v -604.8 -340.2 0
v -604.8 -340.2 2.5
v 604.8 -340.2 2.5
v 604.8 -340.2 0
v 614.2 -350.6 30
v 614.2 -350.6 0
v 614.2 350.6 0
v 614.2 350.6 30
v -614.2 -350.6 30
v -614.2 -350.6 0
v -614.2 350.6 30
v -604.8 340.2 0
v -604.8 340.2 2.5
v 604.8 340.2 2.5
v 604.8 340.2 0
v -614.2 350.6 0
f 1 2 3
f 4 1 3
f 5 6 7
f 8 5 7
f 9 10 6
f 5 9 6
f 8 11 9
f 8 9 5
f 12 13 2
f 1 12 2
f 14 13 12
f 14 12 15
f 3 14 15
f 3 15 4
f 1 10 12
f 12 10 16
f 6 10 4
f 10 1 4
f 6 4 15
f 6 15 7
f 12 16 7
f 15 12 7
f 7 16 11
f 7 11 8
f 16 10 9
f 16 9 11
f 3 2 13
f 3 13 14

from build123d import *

# Parameters (mm, degrees)
F0_W     = 1228.4
F0_H     = 701.2
F1_DEPTH = 30
F2_W     = 1209.6
F2_H     = 680.4
F3_DEPTH = 2.5


with BuildPart() as f1:
    # F0 (on Top) → F1 (new body)
    with BuildSketch(Plane.XY):
        Rectangle(F0_W, F0_H)
    extrude(amount=F1_DEPTH)

    # F2 (on face) → F3 (cut, symmetric)
    with BuildSketch(Plane(origin=(0, 0, 0), x_dir=(1, 0, 0), z_dir=(0, 0, -1))):
        Rectangle(F2_W, F2_H)
    extrude(amount=-F3_DEPTH, both=True, mode=Mode.SUBTRACT)


solid = f1.part
